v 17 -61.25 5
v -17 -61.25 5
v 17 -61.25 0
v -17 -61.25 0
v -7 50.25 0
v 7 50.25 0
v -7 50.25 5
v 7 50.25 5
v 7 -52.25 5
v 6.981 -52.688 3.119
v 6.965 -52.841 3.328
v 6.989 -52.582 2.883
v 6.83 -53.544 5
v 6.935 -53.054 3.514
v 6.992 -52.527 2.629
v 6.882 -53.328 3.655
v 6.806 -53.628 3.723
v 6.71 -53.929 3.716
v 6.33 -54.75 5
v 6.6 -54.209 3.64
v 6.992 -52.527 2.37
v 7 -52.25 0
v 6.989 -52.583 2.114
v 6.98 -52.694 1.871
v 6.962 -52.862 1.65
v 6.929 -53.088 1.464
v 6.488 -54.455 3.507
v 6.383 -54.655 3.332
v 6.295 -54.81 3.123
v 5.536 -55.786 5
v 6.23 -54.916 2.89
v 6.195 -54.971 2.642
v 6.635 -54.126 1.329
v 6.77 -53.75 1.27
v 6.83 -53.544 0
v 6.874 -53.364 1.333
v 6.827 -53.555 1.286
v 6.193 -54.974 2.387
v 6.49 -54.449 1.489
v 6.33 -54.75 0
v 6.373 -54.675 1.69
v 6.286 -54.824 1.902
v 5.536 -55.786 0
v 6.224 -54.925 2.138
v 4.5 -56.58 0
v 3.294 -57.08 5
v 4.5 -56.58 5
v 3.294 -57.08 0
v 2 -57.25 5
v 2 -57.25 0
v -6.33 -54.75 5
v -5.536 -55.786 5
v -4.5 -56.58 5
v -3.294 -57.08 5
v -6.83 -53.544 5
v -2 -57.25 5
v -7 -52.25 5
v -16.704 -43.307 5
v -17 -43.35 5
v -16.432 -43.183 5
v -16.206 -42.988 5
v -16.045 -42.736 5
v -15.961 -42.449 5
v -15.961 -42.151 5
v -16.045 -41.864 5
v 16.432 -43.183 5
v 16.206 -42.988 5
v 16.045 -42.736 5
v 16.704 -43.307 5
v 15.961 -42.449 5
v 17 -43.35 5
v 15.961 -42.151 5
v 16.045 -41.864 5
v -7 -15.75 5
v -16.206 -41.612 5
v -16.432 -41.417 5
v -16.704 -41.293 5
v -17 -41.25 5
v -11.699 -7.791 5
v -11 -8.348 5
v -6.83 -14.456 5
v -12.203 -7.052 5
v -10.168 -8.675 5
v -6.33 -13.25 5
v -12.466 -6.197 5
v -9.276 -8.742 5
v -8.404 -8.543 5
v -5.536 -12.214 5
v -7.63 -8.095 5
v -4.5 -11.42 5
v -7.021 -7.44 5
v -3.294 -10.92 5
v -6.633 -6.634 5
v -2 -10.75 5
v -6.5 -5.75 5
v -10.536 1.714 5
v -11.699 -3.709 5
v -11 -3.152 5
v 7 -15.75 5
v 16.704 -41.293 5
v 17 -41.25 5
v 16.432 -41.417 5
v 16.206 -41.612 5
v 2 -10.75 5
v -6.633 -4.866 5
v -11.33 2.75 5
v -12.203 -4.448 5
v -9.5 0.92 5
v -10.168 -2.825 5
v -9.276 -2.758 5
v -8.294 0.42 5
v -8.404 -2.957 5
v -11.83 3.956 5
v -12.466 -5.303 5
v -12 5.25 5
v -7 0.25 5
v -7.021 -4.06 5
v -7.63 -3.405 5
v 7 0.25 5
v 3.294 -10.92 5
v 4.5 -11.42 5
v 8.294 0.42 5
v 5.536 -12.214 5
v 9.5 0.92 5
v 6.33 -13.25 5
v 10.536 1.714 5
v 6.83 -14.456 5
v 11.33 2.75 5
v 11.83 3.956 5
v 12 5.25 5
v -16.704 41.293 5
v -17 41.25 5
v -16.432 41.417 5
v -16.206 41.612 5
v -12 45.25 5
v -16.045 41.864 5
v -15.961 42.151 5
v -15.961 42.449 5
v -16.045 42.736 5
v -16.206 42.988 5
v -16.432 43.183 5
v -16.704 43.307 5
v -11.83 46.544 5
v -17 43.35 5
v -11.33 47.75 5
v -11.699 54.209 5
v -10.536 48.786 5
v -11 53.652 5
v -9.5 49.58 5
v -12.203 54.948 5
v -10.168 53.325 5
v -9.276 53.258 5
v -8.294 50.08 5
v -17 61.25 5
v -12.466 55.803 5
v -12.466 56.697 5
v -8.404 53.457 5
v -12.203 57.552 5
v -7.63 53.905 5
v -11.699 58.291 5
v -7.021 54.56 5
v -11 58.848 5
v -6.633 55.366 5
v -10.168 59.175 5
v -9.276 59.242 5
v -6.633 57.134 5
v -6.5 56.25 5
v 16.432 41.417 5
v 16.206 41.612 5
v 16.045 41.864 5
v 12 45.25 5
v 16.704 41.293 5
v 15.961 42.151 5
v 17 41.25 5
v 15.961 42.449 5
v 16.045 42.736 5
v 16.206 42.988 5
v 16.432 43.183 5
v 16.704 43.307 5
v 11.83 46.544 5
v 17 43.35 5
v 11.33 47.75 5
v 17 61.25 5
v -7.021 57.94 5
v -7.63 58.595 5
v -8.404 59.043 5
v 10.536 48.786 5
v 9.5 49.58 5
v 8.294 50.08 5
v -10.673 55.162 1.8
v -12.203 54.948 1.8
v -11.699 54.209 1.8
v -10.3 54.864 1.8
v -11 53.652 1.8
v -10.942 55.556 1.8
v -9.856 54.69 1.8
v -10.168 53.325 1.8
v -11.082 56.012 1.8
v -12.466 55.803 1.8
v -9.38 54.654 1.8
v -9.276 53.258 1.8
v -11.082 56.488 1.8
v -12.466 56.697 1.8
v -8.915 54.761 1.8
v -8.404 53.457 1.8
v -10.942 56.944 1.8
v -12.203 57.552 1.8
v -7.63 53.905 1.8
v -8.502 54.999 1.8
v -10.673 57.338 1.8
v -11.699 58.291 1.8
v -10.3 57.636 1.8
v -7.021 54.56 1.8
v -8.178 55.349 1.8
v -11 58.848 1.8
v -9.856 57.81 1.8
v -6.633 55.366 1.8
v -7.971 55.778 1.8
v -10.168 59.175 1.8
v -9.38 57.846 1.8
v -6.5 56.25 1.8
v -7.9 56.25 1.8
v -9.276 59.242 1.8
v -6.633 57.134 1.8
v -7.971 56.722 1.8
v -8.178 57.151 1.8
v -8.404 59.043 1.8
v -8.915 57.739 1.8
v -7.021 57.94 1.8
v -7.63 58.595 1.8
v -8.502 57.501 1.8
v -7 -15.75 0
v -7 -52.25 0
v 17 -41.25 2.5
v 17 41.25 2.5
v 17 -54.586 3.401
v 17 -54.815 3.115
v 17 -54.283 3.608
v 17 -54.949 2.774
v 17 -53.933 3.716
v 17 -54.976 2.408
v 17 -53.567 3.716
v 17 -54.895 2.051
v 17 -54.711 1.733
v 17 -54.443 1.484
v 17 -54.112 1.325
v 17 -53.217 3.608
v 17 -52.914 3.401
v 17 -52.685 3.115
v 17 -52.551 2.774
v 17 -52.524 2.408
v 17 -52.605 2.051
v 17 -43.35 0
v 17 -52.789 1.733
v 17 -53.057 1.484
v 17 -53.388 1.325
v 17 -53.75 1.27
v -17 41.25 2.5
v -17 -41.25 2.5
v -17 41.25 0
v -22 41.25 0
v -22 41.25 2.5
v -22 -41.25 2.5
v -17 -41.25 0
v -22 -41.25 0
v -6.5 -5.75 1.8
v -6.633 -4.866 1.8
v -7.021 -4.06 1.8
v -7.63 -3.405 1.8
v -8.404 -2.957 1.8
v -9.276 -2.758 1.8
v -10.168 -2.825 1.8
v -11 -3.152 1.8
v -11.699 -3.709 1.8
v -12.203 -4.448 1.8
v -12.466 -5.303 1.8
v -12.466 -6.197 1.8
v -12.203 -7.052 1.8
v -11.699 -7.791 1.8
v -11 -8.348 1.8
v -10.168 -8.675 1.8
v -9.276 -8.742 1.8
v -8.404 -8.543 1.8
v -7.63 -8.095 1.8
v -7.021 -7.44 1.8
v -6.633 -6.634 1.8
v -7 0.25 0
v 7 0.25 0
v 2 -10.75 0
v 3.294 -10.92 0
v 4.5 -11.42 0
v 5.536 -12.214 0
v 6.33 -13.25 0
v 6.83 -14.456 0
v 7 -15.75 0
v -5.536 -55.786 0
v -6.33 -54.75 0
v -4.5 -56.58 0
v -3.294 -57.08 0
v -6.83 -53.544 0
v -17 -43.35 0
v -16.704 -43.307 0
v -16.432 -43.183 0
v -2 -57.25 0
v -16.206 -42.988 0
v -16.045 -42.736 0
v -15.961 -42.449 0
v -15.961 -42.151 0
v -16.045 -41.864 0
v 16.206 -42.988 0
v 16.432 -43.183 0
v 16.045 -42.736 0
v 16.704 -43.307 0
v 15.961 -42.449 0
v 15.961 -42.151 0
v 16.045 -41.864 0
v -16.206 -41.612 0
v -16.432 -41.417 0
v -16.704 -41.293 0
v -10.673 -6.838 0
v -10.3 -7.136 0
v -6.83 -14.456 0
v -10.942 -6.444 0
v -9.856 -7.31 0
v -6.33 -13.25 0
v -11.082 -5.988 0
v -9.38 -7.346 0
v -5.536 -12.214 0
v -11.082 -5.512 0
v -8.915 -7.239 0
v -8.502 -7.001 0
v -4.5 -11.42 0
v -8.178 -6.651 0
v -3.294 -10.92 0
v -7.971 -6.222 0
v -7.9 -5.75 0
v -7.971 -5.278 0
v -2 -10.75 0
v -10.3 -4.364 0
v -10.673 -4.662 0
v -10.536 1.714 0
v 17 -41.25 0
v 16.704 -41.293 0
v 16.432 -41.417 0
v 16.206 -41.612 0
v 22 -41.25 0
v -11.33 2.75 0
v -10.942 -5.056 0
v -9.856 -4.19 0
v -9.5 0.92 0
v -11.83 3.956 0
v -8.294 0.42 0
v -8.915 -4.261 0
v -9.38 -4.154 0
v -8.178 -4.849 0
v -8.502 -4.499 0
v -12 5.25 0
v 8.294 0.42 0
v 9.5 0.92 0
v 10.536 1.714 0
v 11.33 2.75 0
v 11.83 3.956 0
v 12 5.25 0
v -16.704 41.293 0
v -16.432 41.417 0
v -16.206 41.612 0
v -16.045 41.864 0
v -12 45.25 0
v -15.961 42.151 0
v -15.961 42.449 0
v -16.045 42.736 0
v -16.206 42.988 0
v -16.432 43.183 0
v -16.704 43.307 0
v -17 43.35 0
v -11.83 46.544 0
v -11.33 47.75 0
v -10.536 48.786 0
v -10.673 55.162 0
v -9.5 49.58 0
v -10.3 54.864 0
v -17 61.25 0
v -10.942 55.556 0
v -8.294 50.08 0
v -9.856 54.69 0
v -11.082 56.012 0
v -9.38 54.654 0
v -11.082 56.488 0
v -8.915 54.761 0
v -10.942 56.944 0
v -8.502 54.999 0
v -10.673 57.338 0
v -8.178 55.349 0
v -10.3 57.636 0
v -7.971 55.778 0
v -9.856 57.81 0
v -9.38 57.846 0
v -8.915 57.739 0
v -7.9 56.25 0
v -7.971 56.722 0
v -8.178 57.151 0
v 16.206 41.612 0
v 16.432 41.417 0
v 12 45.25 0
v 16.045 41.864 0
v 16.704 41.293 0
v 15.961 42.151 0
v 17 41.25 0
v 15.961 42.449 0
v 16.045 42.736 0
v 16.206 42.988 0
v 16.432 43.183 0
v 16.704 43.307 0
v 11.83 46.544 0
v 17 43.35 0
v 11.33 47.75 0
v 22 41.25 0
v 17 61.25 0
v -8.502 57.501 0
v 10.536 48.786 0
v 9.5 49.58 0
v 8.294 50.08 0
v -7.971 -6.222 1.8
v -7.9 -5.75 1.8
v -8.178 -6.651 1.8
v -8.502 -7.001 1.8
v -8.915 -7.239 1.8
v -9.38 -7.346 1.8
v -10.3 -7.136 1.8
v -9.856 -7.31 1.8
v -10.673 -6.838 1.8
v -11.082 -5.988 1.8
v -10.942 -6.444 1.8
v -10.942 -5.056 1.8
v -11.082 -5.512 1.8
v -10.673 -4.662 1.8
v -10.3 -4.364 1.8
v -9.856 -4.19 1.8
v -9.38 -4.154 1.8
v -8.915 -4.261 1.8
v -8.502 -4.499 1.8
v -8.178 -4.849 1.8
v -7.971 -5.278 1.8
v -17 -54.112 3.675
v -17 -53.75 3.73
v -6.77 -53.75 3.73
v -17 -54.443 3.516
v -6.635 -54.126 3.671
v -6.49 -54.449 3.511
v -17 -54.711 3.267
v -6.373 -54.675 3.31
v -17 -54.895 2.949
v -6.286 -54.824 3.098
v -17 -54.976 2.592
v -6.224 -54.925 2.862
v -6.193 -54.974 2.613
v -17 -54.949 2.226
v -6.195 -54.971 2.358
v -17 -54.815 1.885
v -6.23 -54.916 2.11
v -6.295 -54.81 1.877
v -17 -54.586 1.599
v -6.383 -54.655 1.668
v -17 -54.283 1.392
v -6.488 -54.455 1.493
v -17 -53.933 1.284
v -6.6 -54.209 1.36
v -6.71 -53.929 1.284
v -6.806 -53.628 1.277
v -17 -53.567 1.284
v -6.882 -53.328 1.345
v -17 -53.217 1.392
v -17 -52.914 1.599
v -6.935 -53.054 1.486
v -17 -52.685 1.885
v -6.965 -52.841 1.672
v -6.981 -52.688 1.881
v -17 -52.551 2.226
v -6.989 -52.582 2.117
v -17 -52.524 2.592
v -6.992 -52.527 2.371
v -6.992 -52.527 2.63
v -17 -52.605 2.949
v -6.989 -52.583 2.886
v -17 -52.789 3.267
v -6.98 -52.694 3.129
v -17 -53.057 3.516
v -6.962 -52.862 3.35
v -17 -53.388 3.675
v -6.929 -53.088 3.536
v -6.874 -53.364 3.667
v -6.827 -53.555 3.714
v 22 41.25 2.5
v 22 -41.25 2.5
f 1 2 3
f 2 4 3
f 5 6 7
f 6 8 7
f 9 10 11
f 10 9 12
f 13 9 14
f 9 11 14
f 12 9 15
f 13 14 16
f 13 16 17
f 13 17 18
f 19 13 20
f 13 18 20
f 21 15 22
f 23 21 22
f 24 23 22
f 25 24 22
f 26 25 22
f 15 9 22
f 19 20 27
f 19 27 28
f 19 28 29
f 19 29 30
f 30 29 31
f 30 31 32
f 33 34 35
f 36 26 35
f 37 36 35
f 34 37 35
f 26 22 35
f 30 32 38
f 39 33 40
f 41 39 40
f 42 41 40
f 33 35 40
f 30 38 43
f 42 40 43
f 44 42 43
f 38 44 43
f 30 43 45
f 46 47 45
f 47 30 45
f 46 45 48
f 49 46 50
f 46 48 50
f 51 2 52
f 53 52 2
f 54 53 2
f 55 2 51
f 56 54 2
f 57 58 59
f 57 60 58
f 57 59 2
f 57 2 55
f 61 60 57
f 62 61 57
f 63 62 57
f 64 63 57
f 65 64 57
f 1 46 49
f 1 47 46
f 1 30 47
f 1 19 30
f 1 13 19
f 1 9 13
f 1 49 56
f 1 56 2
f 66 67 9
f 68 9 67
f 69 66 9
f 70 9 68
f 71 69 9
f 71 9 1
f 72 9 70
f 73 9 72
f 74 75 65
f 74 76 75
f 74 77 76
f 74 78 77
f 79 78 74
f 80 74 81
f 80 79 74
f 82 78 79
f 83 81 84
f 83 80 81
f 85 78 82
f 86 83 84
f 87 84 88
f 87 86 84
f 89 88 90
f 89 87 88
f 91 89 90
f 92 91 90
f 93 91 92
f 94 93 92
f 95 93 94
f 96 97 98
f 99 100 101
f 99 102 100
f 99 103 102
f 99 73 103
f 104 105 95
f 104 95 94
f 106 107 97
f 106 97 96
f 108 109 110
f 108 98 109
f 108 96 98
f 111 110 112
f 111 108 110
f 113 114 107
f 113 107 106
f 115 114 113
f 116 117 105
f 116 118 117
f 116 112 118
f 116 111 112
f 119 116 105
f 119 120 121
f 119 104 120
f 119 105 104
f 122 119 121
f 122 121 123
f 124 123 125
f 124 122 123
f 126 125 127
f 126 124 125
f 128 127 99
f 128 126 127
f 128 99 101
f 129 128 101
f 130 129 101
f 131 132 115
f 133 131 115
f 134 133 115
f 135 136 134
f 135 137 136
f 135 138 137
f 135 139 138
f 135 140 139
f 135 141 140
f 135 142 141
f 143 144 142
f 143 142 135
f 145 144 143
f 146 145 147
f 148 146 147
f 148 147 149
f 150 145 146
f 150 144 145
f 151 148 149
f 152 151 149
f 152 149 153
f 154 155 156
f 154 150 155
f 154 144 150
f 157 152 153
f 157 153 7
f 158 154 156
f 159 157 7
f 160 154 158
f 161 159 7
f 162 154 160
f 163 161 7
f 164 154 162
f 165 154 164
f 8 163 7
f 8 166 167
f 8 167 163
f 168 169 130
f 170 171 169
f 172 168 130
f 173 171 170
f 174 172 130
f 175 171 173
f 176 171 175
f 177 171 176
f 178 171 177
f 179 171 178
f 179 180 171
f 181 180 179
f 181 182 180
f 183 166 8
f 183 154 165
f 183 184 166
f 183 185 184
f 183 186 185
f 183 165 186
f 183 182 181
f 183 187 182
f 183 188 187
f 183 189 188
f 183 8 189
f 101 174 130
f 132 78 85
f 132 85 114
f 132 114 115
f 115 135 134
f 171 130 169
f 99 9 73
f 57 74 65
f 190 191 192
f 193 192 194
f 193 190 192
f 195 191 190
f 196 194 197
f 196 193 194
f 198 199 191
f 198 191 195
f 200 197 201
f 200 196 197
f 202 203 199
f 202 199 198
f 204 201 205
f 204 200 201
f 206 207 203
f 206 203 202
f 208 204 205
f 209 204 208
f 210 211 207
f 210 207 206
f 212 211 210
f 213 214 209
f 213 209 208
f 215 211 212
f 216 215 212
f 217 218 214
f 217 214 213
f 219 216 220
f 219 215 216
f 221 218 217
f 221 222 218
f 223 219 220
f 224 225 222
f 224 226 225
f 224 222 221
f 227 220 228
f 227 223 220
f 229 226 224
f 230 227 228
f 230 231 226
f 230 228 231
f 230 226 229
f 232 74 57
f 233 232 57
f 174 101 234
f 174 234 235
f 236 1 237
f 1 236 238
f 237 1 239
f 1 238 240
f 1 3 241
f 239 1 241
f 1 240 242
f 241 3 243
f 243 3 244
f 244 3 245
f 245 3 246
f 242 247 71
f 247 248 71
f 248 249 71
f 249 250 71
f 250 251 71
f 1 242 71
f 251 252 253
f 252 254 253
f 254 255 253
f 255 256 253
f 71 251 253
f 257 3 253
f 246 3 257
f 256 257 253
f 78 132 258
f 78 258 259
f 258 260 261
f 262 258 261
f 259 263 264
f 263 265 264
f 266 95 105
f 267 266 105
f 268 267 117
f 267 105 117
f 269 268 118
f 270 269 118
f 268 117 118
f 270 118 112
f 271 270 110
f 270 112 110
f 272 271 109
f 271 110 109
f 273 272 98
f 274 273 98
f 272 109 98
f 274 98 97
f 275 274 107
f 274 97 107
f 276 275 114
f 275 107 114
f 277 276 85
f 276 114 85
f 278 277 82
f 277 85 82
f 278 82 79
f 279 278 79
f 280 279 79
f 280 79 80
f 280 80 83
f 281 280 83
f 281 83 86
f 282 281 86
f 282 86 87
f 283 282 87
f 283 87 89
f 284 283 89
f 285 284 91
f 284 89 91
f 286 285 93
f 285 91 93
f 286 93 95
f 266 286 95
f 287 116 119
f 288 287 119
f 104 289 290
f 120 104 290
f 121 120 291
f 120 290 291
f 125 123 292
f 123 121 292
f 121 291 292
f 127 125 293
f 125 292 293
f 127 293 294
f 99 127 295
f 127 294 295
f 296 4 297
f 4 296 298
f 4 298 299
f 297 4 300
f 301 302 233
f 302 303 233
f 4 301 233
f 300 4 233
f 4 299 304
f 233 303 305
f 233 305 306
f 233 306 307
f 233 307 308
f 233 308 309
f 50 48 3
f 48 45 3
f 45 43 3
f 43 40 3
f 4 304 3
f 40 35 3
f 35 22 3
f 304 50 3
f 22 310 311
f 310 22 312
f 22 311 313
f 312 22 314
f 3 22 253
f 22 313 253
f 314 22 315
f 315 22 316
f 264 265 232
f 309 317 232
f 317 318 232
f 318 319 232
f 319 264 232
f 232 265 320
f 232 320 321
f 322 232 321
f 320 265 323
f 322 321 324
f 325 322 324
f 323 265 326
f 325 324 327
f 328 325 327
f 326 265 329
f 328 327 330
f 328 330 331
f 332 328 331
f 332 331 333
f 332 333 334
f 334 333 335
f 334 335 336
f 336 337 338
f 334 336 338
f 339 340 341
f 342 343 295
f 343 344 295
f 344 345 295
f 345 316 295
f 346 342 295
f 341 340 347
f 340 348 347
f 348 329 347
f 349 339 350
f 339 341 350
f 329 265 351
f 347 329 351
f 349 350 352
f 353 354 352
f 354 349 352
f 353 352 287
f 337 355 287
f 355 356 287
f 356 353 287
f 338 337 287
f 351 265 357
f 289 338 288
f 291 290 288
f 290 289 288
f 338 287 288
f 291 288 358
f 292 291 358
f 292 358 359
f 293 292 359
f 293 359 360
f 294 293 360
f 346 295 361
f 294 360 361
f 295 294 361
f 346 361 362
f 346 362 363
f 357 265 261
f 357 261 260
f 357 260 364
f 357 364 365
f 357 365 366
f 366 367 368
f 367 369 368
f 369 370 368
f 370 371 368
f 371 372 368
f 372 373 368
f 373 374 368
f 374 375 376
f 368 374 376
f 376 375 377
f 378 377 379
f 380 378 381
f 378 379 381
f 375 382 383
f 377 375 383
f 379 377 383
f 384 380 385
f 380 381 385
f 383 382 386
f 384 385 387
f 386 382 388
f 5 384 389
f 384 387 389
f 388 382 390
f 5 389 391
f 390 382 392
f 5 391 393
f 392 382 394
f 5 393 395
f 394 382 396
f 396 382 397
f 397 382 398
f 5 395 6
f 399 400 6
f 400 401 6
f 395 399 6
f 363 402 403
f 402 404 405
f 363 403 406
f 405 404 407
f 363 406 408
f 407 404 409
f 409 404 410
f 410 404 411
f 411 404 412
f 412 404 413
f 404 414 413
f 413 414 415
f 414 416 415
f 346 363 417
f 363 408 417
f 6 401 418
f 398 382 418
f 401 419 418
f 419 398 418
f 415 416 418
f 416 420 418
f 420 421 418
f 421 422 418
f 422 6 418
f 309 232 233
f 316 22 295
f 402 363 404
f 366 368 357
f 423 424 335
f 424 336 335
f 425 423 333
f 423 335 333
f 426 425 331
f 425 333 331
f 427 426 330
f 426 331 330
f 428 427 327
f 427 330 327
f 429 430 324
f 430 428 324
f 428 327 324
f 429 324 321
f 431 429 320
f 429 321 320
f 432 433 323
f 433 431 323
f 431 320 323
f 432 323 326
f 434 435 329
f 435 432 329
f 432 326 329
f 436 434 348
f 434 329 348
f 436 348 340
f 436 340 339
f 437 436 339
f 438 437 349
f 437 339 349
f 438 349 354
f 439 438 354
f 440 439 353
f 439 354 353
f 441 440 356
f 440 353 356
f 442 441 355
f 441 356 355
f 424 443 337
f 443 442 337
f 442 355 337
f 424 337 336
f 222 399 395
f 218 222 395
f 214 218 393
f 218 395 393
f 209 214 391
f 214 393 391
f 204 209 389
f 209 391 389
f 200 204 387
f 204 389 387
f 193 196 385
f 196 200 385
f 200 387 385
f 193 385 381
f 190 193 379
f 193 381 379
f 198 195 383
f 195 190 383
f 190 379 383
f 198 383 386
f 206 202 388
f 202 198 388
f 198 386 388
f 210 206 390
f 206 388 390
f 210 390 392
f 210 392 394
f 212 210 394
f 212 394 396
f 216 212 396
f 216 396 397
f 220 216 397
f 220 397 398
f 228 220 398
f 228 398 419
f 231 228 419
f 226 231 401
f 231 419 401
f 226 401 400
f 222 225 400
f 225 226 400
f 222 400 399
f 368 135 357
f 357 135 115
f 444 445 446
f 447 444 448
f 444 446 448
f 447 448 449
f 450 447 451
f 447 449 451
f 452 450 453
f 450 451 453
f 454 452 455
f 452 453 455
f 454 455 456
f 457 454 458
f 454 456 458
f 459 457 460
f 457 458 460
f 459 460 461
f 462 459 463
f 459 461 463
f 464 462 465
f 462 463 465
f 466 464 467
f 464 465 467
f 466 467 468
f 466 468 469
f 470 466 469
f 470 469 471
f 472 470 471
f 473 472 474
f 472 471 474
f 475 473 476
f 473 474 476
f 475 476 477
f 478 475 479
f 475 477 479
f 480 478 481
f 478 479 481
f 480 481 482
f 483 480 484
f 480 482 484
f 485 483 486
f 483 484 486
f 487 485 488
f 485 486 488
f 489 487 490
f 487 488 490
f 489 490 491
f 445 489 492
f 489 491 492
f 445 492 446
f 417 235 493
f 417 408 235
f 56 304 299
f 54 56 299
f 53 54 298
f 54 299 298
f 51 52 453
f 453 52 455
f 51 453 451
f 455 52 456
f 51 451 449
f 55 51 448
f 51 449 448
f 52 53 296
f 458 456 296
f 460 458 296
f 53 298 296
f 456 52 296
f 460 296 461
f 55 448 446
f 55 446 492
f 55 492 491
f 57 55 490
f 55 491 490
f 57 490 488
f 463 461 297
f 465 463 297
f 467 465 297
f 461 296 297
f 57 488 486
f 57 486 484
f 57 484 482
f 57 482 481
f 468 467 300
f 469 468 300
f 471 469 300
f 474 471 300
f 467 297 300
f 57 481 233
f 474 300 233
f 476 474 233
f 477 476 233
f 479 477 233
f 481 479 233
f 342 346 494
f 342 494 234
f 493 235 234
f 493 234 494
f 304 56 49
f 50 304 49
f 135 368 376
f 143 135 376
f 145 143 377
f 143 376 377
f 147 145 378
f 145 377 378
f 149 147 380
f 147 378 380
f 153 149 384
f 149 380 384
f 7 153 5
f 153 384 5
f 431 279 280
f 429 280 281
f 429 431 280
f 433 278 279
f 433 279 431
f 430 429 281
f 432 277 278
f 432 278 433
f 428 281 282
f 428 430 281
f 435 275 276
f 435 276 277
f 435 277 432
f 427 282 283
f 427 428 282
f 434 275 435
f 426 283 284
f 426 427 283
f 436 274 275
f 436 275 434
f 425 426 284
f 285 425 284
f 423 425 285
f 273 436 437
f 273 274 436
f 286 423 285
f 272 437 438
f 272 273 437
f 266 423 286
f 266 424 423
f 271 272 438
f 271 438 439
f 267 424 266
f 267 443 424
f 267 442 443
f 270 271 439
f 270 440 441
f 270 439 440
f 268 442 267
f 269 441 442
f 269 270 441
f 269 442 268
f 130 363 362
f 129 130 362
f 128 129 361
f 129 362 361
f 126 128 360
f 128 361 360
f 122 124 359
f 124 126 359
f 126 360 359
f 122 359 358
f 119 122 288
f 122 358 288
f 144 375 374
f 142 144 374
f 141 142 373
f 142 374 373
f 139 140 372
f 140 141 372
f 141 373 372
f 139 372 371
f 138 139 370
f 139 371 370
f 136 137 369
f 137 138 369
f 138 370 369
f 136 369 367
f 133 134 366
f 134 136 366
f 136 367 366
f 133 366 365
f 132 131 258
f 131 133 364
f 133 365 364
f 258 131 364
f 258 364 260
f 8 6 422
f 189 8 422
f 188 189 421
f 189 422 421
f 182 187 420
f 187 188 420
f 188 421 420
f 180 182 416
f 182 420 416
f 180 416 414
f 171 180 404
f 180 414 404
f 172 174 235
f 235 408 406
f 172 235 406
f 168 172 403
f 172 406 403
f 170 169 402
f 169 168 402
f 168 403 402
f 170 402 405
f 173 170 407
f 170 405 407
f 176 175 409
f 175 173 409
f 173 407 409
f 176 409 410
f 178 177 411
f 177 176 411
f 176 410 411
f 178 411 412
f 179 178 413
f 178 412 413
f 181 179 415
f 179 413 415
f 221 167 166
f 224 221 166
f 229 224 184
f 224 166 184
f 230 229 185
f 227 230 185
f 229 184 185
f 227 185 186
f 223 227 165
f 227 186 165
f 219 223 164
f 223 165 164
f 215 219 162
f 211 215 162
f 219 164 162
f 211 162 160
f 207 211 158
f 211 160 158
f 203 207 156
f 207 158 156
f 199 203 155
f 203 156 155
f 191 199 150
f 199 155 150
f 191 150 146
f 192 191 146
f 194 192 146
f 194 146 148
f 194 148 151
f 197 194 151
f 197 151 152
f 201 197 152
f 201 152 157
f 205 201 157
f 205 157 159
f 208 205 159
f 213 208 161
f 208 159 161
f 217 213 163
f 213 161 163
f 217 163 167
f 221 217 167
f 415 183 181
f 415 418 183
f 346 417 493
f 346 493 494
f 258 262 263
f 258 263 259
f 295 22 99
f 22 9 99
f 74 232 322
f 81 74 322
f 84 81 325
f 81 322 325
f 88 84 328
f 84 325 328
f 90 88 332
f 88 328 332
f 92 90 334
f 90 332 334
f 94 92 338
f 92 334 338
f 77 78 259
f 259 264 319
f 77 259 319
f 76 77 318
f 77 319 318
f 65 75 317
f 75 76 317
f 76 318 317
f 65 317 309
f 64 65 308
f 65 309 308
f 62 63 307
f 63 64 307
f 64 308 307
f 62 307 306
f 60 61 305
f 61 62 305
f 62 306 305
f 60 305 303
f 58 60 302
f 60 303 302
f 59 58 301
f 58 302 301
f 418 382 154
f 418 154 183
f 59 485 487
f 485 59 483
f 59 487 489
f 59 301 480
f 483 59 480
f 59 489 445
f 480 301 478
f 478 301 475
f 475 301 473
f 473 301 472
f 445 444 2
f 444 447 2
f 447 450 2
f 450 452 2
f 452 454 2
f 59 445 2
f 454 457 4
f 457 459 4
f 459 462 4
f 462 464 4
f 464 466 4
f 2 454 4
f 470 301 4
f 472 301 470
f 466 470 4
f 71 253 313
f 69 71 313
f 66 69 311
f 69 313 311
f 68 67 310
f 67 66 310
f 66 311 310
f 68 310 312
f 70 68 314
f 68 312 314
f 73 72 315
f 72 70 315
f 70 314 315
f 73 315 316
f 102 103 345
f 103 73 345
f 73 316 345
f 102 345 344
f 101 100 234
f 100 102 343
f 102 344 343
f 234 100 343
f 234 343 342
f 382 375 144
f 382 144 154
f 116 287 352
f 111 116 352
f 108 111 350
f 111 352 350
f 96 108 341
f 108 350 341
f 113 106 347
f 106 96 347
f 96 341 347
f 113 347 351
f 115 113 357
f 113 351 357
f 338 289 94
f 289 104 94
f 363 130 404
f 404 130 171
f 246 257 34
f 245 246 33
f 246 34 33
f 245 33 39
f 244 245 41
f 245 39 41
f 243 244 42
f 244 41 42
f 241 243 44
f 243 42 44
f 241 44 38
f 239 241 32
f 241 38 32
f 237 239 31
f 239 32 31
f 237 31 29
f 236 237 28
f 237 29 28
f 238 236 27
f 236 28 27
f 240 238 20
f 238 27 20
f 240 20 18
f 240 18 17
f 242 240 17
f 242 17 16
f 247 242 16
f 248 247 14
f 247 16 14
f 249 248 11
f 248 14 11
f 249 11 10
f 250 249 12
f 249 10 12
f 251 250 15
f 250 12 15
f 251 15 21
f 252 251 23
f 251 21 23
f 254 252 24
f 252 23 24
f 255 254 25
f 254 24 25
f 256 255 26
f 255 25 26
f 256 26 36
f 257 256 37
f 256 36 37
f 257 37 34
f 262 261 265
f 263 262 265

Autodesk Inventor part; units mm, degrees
ref_plane "YZ Plane" through (0, 0, 0) normal (1, 0, 0) x (0, 1, 0)
ref_plane "XZ Plane" through (0, 0, 0) normal (0, 1, 0) x (-1, 0, 0)
ref_plane "XY Plane" through (0, 0, 0) normal (0, 0, 1) x (1, 0, 0)
sketch "スケッチ1" plane through (0, 0, 0) normal (0, 0, 1) x (1, 0, 0)
  line L0 (-17, -61.25) -> (17, -61.25) construction
  line L1 (17, -61.25) -> (17, 61.25) construction
  line L2 (17, 61.25) -> (-17, 61.25) construction
  line L3 (-17, 61.25) -> (-17, -61.25) construction
  line L4 (-17, -61.25) -> (17, 61.25) construction
  line L5 (17, -61.25) -> (-17, 61.25) construction
  line L6 (-17, 43.35) -> (-17, 61.25)
  line L7 (-17, 61.25) -> (17, 61.25)
  line L8 (17, 61.25) -> (17, 43.35)
  line L9 (-17, -43.35) -> (-17, -61.25)
  line L10 (-17, -61.25) -> (17, -61.25)
  line L11 (17, -61.25) -> (17, -43.35)
  line L12 (-17, 41.25) -> (-22, 41.25)
  line L13 (-22, 41.25) -> (-22, -41.25)
  line L14 (-22, -41.25) -> (-17, -41.25)
  line L15 (17, 41.25) -> (22, 41.25)
  line L16 (22, 41.25) -> (22, -41.25)
  line L17 (22, -41.25) -> (17, -41.25)
  arc A0 (-17, 41.25) -> (-17, 43.35) centre (-17, 42.3) ccw
  arc A1 (-17, -43.35) -> (-17, -41.25) centre (-17, -42.3) ccw
  arc A2 (17, 43.35) -> (17, 41.25) centre (17, 42.3) ccw
  arc A3 (17, -41.25) -> (17, -43.35) centre (17, -42.3) ccw
  line L18 (0, 0) -> (17, 0) construction
  line L19 (0, 0) -> (0, 61.25) construction
  line L20 (-9.5, 56.25) -> (9.5, 56.25) construction
  line L21 (9.5, 56.25) -> (9.5, -5.75) construction
  line L22 (9.5, -5.75) -> (-9.5, -5.75) construction
  line L23 (-9.5, -5.75) -> (-9.5, 56.25) construction
  circle A4 centre (-9.5, 56.25) radius 1.6
  circle A5 centre (-9.5, -5.75) radius 1.6
  point P0 (0, 56.25)
  point P1 (0, 0)
  dimension "d87" = 1.05
  dimension "d88" = 122.5
  dimension "d89" = 5
  dimension "d90" = 20
  dimension "d91" = 34
  dimension "d92" = 3.2
  dimension "d93" = 7.5
  dimension "d94" = 5
  dimension "d112" = 62
extrude "押し出し1" add sketch "スケッチ1" along normal blind 5
sketch "スケッチ2" plane through (0, 0, 5) normal (0, 0, 1) x (1, 0, 0)
  line L0 (-17, 61.25) -> (-17, 43.35) projected
  line L1 (17, 43.35) -> (17, 61.25) projected
  line L2 (-40.5884, 60.19) -> (-17, 60.19)
  line L3 (-17, 60.19) -> (-17, -101.7483)
  line L4 (-17, -101.7483) -> (-40.5884, -101.7483)
  line L5 (-40.5884, -101.7483) -> (-40.5884, 60.19)
  line L6 (53.5752, 90.4043) -> (17, 90.4043)
  line L7 (17, 90.4043) -> (17, -93.5321)
  line L8 (17, -93.5321) -> (53.5752, -93.5321)
  line L9 (53.5752, -93.5321) -> (53.5752, 90.4043)
  point P0 (0, 0)
extrude "押し出し2" cut sketch "スケッチ2" against normal blind 2.5
sketch "スケッチ3" plane through (0, 0, 5) normal (0, 0, 1) x (1, 0, 0)
  line L0 (17, -41.25) -> (17, 41.25) projected
  line L1 (17, 61.25) -> (-17, 61.25) projected
  line L2 (-17, 41.25) -> (-17, -41.25) projected
  line L3 (-17, -61.25) -> (17, -61.25) projected
  circle A0 centre (-9.5, -5.75) radius 1.6 projected
  circle A1 centre (-9.5, 56.25) radius 1.6 projected
  line L4 (-7, -57.25) -> (7, -57.25)
  line L5 (7, -57.25) -> (7, -10.75)
  line L6 (7, -10.75) -> (-7, -10.75)
  line L7 (-7, -10.75) -> (-7, -57.25)
  line L8 (-12, 0.25) -> (12, 0.25)
  line L9 (12, 0.25) -> (12, 50.25)
  line L10 (12, 50.25) -> (-12, 50.25)
  line L11 (-12, 50.25) -> (-12, 0.25)
  line L12 (0, 61.25) -> (0, -61.25) construction
  line L13 (-17, 0) -> (17, 0) construction
  point P0 (0, 0)
  point P1 (0, 0.25)
  dimension "d100" = 4
  dimension "d105" = 11
  dimension "d108" = 5
  dimension "d114" = 6
  dimension "d115" = 10
  dimension "d116" = 6
extrude "押し出し3" cut sketch "スケッチ3" against normal blind 10 contours L7 L6 L5 L4 | L11 L10 L9 L8
fillet "フィレット1" radius 5 8 edges at (-7, -57.25, 2.5) (-7, -10.75, 2.5) (7, -57.25, 2.5) (7, -10.75, 2.5) (-12, 0.25, 2.5) (-12, 50.25, 2.5) (12, 0.25, 2.5) (12, 50.25, 2.5)
sketch "スケッチ5" plane through (0, 0, 5) normal (0, 0, 1) x (1, 0, 0)
  circle A0 centre (-9.5, 56.25) radius 1.6 projected
  circle A1 centre (-9.5, -5.75) radius 1.6 projected
  circle A2 centre (-9.5, -5.75) radius 3
  circle A3 centre (-9.5, 56.25) radius 3
  point P0 (0, 0)
  dimension "d117" = 6
  dimension "d118" = 6
extrude "押し出し4" cut sketch "スケッチ5" against normal blind 3.2
sketch "スケッチ7" plane through (-17, -61.25, 0) normal (-1, 0, 0) x (0, 0, 1)
  line L0 (0, 0) -> (0, 17.9) projected
  line L1 (5, 17.9) -> (5, 0) projected
  line L2 (0, 0) -> (5, 0) projected
  point P0 (0, 61.25)
  point P1 (2.5, 7.5)
  dimension "d130" = 5
  dimension "d131" = 7.5
  dimension "d132" = 2.5
hole "穴1" at (-17, -53.75, 2.5) direction (1, 0, 0) diameter 2.459 depth 12 thread size "M3x0.5" class "6H" standard "ISO Metric profile"
sketch "スケッチ8" plane through (17, -61.25, 0) normal (1, 0, 0) x (0, 0, -1)
  line L0 (0, 0) -> (-5, 0) projected
  line L1 (-5, 0) -> (-5, 17.9) projected
  point P0 (0, 61.25)
  point P1 (-2.5, 7.5)
  dimension "d140" = 7.5
  dimension "d141" = 2.5
hole "穴2" at (17, -53.75, 2.5) direction (-1, 0, 0) diameter 2.459 depth 12 thread size "M3x0.5" class "6H" standard "ISO Metric profile"
equation "\"d88\" = d83"
equation "\"d90\" = d84"
equation "\"d132\" = 0.5 * d130"
equation "\"d140\" = d131"
equation "\"d141\" = d132"
equation "\"d83\" = 122.5"
equation "\"d84\" = 20"
properties part number "コックピット_2_サブフレーム_5" material "アセタール樹脂、黒"
